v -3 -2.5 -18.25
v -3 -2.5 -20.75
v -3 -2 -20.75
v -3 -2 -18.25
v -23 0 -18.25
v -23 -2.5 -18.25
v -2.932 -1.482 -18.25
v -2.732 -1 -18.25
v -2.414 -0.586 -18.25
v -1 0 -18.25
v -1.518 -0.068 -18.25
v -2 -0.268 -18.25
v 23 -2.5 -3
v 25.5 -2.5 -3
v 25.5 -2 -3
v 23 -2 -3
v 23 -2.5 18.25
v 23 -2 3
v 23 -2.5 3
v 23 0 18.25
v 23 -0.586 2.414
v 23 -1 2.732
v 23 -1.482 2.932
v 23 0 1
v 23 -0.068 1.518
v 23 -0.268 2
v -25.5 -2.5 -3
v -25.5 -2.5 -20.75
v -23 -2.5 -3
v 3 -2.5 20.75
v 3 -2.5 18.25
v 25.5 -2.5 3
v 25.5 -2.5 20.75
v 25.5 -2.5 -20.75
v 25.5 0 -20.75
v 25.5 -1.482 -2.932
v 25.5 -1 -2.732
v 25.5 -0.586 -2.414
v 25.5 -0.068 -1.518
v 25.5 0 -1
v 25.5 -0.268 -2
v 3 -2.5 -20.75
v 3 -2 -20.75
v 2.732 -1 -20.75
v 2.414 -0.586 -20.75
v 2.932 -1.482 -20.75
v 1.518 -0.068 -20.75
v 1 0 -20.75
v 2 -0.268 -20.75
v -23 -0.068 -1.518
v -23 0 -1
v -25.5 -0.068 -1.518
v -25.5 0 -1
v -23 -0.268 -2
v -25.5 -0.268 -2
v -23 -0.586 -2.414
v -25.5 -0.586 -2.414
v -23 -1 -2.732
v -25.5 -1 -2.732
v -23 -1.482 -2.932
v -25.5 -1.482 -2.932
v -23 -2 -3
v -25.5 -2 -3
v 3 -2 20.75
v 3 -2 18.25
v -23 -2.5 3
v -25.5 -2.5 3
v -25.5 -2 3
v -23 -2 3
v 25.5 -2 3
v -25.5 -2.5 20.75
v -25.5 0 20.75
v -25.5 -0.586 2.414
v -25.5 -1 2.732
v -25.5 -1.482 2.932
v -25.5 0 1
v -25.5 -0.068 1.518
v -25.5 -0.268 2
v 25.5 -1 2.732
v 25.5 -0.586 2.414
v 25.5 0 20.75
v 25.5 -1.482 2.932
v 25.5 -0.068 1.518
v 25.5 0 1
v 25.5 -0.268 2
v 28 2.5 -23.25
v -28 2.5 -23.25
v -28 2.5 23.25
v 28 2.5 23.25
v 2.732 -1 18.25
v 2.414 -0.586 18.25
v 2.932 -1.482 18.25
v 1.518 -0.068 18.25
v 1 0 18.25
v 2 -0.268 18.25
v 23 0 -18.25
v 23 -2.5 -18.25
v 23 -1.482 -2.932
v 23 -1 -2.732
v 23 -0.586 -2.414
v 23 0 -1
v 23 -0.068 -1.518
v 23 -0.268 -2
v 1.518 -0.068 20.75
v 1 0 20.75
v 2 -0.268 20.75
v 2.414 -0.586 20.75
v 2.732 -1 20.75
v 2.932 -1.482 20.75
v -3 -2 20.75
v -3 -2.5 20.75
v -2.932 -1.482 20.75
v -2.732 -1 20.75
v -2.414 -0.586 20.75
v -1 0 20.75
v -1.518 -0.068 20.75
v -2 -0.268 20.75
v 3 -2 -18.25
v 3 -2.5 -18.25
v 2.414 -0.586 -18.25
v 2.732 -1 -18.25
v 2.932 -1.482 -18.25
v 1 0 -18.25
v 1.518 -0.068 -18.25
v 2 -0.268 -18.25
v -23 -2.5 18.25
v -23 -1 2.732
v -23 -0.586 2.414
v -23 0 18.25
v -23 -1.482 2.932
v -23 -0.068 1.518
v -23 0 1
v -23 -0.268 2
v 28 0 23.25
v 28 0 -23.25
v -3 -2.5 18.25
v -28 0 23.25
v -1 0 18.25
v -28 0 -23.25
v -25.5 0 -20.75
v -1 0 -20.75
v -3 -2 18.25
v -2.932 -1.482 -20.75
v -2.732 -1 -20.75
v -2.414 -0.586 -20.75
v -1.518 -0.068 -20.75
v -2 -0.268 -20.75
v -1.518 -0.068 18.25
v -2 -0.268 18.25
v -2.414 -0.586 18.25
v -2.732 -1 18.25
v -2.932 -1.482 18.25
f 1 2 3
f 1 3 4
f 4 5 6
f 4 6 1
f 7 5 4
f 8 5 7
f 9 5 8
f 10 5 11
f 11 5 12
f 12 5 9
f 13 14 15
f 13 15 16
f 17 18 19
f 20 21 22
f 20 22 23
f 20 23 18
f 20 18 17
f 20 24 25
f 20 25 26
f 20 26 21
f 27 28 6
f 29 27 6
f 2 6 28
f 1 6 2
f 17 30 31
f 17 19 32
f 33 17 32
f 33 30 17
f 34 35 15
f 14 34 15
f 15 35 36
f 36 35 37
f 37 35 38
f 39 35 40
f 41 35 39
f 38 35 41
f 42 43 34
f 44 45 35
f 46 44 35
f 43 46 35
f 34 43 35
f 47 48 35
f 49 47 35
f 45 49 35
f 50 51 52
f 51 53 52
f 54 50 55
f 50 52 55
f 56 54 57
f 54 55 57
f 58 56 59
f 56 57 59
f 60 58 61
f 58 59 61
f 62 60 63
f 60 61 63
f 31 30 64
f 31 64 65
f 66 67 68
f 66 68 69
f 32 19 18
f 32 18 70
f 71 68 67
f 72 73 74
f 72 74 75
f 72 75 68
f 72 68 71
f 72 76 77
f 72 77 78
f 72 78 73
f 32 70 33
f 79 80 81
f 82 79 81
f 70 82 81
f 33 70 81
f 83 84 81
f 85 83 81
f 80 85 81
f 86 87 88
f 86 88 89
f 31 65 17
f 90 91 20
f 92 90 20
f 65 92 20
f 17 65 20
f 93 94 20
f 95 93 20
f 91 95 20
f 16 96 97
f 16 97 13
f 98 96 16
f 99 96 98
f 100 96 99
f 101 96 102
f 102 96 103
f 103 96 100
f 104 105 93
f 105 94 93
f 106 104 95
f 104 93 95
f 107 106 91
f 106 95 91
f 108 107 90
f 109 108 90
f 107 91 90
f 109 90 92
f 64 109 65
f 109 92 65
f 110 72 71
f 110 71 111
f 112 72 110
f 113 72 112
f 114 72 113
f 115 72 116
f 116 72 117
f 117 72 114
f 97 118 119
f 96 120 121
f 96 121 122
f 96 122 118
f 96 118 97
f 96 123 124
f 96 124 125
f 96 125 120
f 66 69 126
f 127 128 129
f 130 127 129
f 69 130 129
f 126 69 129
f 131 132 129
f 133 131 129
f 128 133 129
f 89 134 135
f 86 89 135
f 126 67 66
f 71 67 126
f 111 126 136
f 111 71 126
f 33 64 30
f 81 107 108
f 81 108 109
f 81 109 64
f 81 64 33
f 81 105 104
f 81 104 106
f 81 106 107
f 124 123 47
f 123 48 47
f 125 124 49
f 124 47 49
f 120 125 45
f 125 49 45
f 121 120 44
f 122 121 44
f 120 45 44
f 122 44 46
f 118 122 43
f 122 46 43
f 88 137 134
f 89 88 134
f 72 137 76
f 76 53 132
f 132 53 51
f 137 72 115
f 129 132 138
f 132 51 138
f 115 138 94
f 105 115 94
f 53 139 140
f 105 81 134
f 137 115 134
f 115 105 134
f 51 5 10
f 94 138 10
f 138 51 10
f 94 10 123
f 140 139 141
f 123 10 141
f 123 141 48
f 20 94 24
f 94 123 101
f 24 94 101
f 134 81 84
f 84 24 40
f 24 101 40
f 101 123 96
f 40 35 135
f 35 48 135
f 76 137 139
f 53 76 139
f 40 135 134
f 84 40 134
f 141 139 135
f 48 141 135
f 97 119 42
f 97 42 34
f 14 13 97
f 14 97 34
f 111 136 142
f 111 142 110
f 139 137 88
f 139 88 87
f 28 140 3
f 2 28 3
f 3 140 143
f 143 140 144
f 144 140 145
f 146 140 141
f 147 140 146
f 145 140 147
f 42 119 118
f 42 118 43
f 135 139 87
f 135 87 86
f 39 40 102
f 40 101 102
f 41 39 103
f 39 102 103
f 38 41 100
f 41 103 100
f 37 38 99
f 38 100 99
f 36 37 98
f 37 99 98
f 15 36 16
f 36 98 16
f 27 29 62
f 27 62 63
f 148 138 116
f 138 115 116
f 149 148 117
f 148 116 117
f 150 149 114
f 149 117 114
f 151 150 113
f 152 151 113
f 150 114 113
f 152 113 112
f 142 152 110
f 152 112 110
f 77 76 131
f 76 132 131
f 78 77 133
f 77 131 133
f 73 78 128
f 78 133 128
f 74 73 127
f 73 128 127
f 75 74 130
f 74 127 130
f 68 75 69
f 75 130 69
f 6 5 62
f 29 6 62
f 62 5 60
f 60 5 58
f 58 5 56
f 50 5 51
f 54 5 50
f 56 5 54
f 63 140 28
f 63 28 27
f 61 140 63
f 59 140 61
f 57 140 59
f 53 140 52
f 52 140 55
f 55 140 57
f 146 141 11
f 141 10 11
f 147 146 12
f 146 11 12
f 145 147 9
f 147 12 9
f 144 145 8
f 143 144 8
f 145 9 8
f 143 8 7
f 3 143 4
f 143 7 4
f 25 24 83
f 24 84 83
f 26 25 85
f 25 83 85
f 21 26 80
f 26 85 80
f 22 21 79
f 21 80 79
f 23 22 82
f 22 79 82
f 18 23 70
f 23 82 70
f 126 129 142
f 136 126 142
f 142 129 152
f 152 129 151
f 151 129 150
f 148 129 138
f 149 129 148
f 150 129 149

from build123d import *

# Parameters (mm, degrees)
SKETCH1_W           = 56
SKETCH1_H           = 46.5
BOSS_EXTRUDE1_DEPTH = 2.5
SKETCH2_W           = 51
SKETCH2_H           = 41.5
SKETCH2_W_2         = 46
SKETCH2_H_2         = 36.5
BOSS_EXTRUDE2_DEPTH = 2.5
CUT_EXTRUDE1_DEPTH  = 2.5
FILLET1_R           = 2


with BuildPart() as part:
    # Sketch1 → Boss-Extrude1 (new body)
    with BuildSketch(Plane(origin=(0, 0, 0), x_dir=(1, 0, 0), z_dir=(0, 1, 0))):
        Rectangle(SKETCH1_W, SKETCH1_H)
    extrude(amount=BOSS_EXTRUDE1_DEPTH)

    # Sketch2 → Boss-Extrude2 (add)
    with BuildSketch(Plane.XZ):
        Rectangle(SKETCH2_W, SKETCH2_H)
        Rectangle(SKETCH2_W_2, SKETCH2_H_2, mode=Mode.SUBTRACT)
    extrude(amount=BOSS_EXTRUDE2_DEPTH)

    # Sketch3 → Cut-Extrude1 (cut)
    with BuildSketch(Plane.XZ.offset(2.5)):
        Polygon((-3, 20.75), (3, 20.75), (3, 3), (25.5, 3), (25.5, -3), (3, -3), (3, -20.75), (-3, -20.75), (-3, -3), (-25.5, -3), (-25.5, 3), (-3, 3), align=None)
    extrude(amount=-CUT_EXTRUDE1_DEPTH, mode=Mode.SUBTRACT)

    # Fillet1
    fillet1_edges = [part.edges().sort_by_distance(p)[0] for p in [
        (-3, 0, 19.5),
        (3, 0, 19.5),
        (24.25, 0, 3),
        (24.25, 0, -3),
        (3, 0, -19.5),
        (-3, 0, -19.5),
        (-24.25, 0, -3),
        (-24.25, 0, 3),
    ]]
    fillet(fillet1_edges, radius=FILLET1_R)


solid = part.part
